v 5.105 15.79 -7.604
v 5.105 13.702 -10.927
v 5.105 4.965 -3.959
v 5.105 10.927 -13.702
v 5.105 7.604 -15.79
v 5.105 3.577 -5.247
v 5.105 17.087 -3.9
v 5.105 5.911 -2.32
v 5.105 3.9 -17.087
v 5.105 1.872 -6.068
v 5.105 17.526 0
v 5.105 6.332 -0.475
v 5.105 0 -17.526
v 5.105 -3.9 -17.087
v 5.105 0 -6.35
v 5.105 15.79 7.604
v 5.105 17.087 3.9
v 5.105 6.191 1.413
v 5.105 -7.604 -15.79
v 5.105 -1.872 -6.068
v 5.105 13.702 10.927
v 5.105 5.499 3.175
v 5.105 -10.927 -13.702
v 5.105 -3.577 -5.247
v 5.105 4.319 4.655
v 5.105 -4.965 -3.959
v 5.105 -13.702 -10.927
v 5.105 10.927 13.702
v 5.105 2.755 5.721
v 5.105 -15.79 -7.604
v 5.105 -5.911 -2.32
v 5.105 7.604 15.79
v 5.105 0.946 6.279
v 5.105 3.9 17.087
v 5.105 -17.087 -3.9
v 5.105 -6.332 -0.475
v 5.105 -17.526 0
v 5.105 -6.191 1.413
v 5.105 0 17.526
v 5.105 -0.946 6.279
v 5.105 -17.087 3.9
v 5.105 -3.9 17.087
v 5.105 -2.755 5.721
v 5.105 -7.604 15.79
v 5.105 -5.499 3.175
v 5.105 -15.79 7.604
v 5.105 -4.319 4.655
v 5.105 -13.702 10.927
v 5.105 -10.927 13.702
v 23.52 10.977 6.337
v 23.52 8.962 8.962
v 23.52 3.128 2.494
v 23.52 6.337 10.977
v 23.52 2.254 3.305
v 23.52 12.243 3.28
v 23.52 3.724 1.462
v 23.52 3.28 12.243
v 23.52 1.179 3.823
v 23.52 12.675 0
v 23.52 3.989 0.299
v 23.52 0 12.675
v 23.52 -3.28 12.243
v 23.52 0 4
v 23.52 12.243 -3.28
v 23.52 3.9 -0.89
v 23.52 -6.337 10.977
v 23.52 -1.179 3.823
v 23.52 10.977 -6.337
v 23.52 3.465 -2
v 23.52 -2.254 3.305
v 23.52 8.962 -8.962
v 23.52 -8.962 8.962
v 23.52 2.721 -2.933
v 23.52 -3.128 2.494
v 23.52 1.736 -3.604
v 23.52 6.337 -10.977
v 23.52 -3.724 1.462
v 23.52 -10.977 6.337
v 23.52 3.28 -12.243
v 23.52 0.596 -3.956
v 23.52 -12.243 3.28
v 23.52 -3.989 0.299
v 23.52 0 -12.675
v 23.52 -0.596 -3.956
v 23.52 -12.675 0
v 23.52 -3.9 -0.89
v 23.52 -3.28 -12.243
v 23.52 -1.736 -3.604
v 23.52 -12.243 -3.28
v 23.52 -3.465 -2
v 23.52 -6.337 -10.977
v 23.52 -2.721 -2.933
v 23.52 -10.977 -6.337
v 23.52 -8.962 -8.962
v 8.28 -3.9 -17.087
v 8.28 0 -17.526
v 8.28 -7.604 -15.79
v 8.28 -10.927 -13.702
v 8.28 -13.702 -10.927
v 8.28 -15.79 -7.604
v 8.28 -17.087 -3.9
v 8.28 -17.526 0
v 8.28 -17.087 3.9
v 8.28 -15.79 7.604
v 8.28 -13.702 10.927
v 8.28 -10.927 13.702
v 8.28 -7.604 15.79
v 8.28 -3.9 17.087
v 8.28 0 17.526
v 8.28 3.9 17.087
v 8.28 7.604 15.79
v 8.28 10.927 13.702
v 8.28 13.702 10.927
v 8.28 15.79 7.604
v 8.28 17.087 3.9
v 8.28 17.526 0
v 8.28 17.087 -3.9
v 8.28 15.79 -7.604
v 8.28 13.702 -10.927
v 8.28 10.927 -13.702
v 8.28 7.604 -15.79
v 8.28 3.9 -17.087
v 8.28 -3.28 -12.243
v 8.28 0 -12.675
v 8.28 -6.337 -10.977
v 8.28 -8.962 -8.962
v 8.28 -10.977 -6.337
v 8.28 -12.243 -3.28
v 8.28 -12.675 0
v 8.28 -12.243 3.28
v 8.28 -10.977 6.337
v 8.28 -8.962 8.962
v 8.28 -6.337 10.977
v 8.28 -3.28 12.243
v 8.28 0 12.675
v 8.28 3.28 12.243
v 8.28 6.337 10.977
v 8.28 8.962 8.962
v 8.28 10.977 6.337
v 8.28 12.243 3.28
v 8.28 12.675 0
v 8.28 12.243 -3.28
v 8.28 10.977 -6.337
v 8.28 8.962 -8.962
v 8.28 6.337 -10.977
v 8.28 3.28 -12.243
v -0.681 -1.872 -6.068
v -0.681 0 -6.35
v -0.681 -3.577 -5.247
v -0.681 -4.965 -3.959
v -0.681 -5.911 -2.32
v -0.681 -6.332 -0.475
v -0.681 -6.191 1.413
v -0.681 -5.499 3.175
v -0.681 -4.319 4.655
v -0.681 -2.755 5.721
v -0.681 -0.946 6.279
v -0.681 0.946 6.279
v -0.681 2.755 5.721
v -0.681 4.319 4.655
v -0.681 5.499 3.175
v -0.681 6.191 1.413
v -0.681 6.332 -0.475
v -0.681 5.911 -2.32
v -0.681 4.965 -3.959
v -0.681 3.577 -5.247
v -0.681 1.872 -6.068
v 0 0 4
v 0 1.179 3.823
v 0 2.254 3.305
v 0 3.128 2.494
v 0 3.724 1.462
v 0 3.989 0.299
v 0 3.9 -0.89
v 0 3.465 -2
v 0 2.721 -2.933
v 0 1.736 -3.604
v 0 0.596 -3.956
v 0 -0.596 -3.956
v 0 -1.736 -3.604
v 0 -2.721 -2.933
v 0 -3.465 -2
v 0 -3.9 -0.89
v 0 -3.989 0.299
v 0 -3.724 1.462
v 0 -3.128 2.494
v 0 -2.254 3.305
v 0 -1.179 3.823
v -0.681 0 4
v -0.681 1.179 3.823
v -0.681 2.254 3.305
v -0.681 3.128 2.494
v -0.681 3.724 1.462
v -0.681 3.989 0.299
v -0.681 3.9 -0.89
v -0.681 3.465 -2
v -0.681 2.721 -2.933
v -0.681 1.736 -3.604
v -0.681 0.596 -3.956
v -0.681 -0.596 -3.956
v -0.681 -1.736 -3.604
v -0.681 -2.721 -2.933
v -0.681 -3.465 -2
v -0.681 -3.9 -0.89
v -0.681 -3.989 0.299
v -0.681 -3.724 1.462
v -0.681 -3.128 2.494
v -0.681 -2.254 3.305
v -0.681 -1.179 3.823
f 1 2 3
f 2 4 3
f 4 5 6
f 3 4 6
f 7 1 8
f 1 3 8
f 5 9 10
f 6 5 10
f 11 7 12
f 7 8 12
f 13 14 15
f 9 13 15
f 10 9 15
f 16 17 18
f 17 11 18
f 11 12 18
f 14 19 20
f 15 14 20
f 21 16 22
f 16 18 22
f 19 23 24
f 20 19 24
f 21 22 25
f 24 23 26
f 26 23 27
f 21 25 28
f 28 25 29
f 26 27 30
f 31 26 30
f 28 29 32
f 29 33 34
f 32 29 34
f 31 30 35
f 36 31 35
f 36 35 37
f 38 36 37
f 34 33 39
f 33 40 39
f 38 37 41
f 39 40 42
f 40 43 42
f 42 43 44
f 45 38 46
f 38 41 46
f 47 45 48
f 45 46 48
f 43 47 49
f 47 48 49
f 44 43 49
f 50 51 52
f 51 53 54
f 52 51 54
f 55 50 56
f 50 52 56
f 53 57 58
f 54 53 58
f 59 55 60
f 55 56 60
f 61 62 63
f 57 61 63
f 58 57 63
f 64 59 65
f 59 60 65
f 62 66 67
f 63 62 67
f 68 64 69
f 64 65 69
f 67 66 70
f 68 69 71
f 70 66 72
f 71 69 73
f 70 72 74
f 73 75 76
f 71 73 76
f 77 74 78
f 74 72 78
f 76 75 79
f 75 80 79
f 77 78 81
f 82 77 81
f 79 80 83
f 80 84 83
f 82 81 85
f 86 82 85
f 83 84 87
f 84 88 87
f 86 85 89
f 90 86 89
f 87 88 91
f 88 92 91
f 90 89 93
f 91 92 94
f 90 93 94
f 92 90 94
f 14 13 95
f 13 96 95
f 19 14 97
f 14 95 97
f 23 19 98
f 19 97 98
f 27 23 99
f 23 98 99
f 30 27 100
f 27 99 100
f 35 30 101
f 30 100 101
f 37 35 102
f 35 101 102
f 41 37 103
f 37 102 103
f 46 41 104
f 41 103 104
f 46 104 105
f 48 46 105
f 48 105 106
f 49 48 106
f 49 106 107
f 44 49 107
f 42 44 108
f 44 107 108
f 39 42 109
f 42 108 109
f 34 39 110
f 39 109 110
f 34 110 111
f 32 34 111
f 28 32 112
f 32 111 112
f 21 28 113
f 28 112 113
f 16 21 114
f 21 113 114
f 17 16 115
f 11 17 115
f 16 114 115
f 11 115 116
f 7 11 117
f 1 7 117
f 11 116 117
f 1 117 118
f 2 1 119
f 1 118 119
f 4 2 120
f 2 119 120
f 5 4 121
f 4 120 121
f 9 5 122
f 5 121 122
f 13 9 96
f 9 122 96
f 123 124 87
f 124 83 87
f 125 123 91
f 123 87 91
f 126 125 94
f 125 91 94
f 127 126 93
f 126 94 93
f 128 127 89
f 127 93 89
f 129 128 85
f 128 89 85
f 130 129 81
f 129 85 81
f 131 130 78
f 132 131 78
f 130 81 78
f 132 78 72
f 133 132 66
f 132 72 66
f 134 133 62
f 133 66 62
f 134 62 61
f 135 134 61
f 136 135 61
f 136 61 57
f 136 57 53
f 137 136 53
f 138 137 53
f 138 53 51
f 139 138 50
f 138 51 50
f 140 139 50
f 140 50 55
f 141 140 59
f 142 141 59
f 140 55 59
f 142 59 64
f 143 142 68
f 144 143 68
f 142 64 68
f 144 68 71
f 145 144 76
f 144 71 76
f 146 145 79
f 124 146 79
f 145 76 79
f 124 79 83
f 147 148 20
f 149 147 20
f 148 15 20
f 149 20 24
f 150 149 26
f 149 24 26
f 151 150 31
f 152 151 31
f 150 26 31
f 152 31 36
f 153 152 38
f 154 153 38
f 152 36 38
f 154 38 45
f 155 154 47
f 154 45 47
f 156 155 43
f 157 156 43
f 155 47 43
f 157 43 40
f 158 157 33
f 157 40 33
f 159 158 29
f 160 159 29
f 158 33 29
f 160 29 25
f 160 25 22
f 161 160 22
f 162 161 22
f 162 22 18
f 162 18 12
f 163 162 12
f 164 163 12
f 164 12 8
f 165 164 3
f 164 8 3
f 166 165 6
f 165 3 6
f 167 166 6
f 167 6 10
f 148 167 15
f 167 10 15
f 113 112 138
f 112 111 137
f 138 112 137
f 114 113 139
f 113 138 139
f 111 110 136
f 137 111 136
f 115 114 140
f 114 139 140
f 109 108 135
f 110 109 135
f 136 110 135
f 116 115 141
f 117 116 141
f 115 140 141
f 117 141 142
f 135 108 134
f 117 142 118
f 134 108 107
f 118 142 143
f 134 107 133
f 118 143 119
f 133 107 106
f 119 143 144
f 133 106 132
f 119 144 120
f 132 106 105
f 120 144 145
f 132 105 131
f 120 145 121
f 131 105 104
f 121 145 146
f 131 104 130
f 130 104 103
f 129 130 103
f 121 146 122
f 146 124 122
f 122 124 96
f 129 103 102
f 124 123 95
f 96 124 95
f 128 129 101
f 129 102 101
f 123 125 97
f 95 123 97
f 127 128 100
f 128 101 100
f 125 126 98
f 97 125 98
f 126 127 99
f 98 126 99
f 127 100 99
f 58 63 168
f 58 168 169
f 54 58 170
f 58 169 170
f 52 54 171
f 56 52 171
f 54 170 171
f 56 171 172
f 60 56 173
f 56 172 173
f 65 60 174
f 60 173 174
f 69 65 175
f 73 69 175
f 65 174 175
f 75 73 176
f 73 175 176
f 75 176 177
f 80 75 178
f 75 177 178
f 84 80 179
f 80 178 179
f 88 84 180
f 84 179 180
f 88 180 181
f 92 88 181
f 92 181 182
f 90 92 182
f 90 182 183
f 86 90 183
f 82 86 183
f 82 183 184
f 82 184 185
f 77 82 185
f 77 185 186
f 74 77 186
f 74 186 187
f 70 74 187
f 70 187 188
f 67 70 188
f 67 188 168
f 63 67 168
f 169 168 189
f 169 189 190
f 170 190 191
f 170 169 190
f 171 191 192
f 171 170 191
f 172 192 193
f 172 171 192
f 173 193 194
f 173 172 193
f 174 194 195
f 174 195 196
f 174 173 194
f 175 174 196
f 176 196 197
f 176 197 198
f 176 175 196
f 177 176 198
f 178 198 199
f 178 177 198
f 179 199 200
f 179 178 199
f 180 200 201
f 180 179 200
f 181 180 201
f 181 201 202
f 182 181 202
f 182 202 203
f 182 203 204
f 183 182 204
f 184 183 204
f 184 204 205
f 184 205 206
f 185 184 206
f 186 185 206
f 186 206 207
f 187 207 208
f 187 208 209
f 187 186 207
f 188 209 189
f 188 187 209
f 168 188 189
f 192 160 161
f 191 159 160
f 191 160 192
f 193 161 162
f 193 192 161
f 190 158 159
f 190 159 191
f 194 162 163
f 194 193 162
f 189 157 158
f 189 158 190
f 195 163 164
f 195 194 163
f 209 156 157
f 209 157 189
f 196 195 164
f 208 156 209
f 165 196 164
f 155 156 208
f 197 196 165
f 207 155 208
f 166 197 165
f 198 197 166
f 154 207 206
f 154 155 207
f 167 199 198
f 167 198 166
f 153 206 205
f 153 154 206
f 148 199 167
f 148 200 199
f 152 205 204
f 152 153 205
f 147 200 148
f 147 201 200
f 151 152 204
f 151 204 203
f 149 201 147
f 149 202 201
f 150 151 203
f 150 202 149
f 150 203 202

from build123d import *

# Parameters (mm, degrees)
SKETCH2_R           = 4.0005
CUT_EXTRUDE1_DEPTH  = 35.169146436
SKETCH3_R           = 6.35
SKETCH3_R_2         = 4.0005
BOSS_EXTRUDE1_DEPTH = 0.68072


with BuildPart() as part:
    # Sketch1 → Revolve1 (revolve)
    with BuildSketch(Plane.XY, mode=Mode.PRIVATE) as revolve1_sk:
        Polygon((0, 0), (0, 6.35), (5.1054, 6.35), (5.1054, 17.526), (8.2804, 17.526), (8.2804, 12.6746), (23.5204, 12.6746), (23.5204, 0), align=None)
    revolve(revolve1_sk.sketch.rotate(Axis((23.5204, 0, 0), (-1, 0, 0)), 90), axis=Axis((23.5204, 0, 0), (-1, 0, 0)))

    # Sketch2 → Cut-Extrude1 (cut, through all)
    with BuildSketch(Plane.ZY):
        Circle(SKETCH2_R)
    extrude(amount=-CUT_EXTRUDE1_DEPTH, mode=Mode.SUBTRACT)

    # Sketch3 → Boss-Extrude1 (add)
    with BuildSketch(Plane.ZY):
        with Locations(Location((0, 0, 0), (0, 0, 180))):
            Circle(SKETCH3_R)
        Circle(SKETCH3_R_2, mode=Mode.SUBTRACT)
    extrude(amount=BOSS_EXTRUDE1_DEPTH)


solid = part.part
